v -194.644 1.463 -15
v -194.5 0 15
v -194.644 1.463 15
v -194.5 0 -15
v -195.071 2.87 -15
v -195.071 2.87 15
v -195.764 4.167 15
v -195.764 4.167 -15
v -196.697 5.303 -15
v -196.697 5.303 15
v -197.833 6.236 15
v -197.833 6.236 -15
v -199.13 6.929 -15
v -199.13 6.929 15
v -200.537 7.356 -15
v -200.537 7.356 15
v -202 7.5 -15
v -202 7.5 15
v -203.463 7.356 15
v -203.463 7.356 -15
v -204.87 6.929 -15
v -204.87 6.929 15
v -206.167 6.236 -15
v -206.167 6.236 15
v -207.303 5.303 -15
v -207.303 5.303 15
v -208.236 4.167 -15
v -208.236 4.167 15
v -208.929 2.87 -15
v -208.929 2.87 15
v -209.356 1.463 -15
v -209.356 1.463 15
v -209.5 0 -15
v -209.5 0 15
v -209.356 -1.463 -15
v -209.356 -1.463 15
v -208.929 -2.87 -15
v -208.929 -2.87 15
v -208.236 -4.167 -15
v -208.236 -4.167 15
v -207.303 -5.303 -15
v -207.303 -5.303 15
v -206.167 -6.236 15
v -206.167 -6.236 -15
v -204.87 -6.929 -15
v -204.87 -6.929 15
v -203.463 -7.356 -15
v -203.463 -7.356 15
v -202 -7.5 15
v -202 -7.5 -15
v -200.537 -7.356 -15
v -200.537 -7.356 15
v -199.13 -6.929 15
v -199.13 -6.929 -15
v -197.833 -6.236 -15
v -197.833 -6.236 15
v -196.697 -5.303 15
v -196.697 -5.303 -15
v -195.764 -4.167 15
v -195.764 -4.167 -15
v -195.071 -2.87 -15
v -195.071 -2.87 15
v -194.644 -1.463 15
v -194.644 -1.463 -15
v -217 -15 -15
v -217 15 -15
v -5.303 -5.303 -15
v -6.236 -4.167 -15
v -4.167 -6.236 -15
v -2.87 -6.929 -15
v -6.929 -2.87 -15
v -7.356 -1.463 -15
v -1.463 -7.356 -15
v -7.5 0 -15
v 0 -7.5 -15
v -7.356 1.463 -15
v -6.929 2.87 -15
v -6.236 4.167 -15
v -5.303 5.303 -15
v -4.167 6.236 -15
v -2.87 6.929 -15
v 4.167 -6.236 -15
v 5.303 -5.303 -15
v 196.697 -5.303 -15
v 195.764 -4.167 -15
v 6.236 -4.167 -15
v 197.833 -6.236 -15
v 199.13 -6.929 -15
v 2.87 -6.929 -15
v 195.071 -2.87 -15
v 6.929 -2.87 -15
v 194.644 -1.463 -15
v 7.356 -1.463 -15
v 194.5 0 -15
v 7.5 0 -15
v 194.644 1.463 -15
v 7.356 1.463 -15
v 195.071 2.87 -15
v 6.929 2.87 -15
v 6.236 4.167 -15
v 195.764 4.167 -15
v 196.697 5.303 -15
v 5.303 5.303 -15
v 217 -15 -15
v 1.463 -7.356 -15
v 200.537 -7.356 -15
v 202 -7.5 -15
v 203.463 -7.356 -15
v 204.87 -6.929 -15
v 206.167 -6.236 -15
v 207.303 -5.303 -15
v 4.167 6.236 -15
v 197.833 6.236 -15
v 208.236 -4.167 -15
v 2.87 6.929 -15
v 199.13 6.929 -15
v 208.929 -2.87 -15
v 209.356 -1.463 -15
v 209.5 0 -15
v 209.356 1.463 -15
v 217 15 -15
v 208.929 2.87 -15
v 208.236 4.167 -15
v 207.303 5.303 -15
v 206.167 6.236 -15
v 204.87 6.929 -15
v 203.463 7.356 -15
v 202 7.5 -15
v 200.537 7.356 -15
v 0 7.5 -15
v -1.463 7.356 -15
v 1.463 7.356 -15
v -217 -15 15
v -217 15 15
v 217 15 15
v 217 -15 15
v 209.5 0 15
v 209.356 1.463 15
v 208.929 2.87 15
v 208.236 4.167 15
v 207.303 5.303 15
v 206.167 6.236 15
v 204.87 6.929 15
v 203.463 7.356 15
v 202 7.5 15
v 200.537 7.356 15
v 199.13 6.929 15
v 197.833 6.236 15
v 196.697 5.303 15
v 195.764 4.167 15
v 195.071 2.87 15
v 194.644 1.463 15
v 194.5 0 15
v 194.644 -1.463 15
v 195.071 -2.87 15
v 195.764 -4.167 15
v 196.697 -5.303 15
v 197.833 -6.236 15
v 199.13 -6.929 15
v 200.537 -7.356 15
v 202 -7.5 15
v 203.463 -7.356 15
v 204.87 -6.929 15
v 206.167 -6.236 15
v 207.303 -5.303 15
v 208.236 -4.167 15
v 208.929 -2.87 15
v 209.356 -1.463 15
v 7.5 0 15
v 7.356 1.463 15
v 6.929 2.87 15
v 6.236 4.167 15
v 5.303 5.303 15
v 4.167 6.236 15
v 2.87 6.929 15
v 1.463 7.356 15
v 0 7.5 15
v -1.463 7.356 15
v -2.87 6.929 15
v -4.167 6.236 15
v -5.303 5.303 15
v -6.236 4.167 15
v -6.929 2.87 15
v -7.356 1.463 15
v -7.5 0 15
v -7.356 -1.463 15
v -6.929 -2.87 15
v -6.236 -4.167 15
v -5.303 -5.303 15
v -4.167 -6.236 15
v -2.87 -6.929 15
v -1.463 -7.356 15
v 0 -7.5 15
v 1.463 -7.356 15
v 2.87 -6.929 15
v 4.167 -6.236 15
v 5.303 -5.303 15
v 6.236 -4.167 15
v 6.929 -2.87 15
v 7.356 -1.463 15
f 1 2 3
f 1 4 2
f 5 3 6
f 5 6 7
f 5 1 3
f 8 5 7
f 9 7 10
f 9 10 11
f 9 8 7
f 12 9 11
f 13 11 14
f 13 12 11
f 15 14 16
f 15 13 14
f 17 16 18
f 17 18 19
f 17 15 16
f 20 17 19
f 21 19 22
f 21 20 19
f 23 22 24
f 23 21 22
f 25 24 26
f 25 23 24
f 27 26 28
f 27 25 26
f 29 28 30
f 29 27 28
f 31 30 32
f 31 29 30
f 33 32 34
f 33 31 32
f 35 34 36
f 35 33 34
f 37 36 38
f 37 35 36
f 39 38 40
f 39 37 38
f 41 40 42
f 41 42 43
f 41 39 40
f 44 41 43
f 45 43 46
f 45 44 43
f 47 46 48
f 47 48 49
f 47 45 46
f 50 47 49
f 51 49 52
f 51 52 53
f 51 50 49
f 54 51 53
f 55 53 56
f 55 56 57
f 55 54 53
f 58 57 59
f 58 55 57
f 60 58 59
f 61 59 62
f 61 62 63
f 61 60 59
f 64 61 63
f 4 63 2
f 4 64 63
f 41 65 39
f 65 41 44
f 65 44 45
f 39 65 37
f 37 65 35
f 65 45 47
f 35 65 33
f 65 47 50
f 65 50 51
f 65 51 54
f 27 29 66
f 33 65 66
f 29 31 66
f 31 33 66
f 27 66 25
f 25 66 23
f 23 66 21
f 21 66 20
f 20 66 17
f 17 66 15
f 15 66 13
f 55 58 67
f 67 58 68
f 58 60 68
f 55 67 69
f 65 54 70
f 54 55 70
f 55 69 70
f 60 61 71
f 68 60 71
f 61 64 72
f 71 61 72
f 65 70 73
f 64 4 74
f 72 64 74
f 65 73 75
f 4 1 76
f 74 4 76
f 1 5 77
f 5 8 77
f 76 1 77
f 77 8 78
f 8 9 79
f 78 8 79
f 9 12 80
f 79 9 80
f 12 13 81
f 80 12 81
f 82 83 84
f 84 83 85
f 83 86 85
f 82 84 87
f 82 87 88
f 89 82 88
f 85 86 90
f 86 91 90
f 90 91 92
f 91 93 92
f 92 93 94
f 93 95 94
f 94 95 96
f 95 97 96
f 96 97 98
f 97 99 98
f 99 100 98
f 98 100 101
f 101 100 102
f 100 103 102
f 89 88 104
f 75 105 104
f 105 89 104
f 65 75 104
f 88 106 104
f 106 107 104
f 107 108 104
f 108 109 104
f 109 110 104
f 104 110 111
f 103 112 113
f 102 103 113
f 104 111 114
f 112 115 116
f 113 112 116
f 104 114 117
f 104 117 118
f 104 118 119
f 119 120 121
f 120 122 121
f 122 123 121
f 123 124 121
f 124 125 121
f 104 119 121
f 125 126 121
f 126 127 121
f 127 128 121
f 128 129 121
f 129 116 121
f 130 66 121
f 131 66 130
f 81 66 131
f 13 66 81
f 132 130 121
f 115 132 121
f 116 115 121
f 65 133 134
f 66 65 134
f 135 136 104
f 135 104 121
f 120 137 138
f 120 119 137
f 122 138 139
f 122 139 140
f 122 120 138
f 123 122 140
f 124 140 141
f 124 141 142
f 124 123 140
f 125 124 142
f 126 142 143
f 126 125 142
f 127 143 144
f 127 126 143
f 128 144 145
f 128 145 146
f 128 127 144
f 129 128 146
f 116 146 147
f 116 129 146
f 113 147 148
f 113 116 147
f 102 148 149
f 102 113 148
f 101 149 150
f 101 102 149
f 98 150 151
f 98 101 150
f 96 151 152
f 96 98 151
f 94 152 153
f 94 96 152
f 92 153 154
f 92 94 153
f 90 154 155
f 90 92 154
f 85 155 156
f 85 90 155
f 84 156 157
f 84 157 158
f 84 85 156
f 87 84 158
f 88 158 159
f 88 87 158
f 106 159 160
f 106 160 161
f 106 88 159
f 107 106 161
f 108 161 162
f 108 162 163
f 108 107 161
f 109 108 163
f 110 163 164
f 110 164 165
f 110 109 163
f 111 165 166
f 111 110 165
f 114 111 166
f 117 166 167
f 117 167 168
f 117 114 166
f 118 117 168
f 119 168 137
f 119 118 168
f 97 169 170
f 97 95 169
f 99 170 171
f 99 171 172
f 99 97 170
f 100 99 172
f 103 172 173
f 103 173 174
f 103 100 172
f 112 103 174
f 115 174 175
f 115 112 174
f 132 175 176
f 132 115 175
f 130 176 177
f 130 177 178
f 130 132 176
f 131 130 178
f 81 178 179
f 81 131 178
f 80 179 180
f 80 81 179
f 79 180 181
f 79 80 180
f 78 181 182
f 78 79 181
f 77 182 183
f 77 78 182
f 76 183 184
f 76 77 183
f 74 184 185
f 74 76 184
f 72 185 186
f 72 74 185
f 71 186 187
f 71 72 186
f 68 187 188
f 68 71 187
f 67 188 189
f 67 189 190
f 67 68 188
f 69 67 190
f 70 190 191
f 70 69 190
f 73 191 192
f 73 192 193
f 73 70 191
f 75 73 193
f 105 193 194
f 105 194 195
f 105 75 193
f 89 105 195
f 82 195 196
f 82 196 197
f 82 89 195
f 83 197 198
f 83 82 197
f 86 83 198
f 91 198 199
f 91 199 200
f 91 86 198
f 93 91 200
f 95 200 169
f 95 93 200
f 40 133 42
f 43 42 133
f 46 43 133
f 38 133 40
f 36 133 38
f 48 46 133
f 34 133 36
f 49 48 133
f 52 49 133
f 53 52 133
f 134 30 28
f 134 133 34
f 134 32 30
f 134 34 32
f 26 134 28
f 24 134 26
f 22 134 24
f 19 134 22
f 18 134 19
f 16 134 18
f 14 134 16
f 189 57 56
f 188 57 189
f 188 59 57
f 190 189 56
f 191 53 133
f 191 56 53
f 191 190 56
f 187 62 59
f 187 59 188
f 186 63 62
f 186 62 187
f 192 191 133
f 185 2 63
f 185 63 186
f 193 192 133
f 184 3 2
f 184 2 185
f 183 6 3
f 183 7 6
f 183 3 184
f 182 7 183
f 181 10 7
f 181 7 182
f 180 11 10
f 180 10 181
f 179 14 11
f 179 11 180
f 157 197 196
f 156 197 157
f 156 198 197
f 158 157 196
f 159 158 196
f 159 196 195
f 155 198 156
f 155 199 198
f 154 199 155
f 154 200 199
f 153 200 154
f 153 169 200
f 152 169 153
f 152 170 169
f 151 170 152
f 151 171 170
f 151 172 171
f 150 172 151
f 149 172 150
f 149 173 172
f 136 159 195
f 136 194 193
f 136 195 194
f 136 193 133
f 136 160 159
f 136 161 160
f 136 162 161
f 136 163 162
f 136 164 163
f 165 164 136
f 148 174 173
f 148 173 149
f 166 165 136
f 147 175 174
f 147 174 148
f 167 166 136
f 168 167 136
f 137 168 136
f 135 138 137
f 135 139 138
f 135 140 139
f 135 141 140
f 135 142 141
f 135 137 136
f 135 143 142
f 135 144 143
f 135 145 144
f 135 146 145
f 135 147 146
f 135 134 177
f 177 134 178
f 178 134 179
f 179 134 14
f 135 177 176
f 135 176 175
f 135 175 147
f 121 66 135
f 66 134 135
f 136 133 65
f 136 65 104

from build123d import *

# Parameters (mm, degrees)
SKETCH1_W           = 434
SKETCH1_H           = 30
SKETCH1_R           = 7.5
BOSS_EXTRUDE1_DEPTH = 15


with BuildPart() as part:
    # Sketch1 → Boss-Extrude1 (new, symmetric)
    with BuildSketch(Plane.XY):
        Rectangle(SKETCH1_W, SKETCH1_H)
        with Locations((-202, 0)):
            Circle(SKETCH1_R, mode=Mode.SUBTRACT)
        with Locations((202, 0)):
            Circle(SKETCH1_R, mode=Mode.SUBTRACT)
        Circle(SKETCH1_R, mode=Mode.SUBTRACT)
    extrude(amount=BOSS_EXTRUDE1_DEPTH, both=True)


solid = part.part
